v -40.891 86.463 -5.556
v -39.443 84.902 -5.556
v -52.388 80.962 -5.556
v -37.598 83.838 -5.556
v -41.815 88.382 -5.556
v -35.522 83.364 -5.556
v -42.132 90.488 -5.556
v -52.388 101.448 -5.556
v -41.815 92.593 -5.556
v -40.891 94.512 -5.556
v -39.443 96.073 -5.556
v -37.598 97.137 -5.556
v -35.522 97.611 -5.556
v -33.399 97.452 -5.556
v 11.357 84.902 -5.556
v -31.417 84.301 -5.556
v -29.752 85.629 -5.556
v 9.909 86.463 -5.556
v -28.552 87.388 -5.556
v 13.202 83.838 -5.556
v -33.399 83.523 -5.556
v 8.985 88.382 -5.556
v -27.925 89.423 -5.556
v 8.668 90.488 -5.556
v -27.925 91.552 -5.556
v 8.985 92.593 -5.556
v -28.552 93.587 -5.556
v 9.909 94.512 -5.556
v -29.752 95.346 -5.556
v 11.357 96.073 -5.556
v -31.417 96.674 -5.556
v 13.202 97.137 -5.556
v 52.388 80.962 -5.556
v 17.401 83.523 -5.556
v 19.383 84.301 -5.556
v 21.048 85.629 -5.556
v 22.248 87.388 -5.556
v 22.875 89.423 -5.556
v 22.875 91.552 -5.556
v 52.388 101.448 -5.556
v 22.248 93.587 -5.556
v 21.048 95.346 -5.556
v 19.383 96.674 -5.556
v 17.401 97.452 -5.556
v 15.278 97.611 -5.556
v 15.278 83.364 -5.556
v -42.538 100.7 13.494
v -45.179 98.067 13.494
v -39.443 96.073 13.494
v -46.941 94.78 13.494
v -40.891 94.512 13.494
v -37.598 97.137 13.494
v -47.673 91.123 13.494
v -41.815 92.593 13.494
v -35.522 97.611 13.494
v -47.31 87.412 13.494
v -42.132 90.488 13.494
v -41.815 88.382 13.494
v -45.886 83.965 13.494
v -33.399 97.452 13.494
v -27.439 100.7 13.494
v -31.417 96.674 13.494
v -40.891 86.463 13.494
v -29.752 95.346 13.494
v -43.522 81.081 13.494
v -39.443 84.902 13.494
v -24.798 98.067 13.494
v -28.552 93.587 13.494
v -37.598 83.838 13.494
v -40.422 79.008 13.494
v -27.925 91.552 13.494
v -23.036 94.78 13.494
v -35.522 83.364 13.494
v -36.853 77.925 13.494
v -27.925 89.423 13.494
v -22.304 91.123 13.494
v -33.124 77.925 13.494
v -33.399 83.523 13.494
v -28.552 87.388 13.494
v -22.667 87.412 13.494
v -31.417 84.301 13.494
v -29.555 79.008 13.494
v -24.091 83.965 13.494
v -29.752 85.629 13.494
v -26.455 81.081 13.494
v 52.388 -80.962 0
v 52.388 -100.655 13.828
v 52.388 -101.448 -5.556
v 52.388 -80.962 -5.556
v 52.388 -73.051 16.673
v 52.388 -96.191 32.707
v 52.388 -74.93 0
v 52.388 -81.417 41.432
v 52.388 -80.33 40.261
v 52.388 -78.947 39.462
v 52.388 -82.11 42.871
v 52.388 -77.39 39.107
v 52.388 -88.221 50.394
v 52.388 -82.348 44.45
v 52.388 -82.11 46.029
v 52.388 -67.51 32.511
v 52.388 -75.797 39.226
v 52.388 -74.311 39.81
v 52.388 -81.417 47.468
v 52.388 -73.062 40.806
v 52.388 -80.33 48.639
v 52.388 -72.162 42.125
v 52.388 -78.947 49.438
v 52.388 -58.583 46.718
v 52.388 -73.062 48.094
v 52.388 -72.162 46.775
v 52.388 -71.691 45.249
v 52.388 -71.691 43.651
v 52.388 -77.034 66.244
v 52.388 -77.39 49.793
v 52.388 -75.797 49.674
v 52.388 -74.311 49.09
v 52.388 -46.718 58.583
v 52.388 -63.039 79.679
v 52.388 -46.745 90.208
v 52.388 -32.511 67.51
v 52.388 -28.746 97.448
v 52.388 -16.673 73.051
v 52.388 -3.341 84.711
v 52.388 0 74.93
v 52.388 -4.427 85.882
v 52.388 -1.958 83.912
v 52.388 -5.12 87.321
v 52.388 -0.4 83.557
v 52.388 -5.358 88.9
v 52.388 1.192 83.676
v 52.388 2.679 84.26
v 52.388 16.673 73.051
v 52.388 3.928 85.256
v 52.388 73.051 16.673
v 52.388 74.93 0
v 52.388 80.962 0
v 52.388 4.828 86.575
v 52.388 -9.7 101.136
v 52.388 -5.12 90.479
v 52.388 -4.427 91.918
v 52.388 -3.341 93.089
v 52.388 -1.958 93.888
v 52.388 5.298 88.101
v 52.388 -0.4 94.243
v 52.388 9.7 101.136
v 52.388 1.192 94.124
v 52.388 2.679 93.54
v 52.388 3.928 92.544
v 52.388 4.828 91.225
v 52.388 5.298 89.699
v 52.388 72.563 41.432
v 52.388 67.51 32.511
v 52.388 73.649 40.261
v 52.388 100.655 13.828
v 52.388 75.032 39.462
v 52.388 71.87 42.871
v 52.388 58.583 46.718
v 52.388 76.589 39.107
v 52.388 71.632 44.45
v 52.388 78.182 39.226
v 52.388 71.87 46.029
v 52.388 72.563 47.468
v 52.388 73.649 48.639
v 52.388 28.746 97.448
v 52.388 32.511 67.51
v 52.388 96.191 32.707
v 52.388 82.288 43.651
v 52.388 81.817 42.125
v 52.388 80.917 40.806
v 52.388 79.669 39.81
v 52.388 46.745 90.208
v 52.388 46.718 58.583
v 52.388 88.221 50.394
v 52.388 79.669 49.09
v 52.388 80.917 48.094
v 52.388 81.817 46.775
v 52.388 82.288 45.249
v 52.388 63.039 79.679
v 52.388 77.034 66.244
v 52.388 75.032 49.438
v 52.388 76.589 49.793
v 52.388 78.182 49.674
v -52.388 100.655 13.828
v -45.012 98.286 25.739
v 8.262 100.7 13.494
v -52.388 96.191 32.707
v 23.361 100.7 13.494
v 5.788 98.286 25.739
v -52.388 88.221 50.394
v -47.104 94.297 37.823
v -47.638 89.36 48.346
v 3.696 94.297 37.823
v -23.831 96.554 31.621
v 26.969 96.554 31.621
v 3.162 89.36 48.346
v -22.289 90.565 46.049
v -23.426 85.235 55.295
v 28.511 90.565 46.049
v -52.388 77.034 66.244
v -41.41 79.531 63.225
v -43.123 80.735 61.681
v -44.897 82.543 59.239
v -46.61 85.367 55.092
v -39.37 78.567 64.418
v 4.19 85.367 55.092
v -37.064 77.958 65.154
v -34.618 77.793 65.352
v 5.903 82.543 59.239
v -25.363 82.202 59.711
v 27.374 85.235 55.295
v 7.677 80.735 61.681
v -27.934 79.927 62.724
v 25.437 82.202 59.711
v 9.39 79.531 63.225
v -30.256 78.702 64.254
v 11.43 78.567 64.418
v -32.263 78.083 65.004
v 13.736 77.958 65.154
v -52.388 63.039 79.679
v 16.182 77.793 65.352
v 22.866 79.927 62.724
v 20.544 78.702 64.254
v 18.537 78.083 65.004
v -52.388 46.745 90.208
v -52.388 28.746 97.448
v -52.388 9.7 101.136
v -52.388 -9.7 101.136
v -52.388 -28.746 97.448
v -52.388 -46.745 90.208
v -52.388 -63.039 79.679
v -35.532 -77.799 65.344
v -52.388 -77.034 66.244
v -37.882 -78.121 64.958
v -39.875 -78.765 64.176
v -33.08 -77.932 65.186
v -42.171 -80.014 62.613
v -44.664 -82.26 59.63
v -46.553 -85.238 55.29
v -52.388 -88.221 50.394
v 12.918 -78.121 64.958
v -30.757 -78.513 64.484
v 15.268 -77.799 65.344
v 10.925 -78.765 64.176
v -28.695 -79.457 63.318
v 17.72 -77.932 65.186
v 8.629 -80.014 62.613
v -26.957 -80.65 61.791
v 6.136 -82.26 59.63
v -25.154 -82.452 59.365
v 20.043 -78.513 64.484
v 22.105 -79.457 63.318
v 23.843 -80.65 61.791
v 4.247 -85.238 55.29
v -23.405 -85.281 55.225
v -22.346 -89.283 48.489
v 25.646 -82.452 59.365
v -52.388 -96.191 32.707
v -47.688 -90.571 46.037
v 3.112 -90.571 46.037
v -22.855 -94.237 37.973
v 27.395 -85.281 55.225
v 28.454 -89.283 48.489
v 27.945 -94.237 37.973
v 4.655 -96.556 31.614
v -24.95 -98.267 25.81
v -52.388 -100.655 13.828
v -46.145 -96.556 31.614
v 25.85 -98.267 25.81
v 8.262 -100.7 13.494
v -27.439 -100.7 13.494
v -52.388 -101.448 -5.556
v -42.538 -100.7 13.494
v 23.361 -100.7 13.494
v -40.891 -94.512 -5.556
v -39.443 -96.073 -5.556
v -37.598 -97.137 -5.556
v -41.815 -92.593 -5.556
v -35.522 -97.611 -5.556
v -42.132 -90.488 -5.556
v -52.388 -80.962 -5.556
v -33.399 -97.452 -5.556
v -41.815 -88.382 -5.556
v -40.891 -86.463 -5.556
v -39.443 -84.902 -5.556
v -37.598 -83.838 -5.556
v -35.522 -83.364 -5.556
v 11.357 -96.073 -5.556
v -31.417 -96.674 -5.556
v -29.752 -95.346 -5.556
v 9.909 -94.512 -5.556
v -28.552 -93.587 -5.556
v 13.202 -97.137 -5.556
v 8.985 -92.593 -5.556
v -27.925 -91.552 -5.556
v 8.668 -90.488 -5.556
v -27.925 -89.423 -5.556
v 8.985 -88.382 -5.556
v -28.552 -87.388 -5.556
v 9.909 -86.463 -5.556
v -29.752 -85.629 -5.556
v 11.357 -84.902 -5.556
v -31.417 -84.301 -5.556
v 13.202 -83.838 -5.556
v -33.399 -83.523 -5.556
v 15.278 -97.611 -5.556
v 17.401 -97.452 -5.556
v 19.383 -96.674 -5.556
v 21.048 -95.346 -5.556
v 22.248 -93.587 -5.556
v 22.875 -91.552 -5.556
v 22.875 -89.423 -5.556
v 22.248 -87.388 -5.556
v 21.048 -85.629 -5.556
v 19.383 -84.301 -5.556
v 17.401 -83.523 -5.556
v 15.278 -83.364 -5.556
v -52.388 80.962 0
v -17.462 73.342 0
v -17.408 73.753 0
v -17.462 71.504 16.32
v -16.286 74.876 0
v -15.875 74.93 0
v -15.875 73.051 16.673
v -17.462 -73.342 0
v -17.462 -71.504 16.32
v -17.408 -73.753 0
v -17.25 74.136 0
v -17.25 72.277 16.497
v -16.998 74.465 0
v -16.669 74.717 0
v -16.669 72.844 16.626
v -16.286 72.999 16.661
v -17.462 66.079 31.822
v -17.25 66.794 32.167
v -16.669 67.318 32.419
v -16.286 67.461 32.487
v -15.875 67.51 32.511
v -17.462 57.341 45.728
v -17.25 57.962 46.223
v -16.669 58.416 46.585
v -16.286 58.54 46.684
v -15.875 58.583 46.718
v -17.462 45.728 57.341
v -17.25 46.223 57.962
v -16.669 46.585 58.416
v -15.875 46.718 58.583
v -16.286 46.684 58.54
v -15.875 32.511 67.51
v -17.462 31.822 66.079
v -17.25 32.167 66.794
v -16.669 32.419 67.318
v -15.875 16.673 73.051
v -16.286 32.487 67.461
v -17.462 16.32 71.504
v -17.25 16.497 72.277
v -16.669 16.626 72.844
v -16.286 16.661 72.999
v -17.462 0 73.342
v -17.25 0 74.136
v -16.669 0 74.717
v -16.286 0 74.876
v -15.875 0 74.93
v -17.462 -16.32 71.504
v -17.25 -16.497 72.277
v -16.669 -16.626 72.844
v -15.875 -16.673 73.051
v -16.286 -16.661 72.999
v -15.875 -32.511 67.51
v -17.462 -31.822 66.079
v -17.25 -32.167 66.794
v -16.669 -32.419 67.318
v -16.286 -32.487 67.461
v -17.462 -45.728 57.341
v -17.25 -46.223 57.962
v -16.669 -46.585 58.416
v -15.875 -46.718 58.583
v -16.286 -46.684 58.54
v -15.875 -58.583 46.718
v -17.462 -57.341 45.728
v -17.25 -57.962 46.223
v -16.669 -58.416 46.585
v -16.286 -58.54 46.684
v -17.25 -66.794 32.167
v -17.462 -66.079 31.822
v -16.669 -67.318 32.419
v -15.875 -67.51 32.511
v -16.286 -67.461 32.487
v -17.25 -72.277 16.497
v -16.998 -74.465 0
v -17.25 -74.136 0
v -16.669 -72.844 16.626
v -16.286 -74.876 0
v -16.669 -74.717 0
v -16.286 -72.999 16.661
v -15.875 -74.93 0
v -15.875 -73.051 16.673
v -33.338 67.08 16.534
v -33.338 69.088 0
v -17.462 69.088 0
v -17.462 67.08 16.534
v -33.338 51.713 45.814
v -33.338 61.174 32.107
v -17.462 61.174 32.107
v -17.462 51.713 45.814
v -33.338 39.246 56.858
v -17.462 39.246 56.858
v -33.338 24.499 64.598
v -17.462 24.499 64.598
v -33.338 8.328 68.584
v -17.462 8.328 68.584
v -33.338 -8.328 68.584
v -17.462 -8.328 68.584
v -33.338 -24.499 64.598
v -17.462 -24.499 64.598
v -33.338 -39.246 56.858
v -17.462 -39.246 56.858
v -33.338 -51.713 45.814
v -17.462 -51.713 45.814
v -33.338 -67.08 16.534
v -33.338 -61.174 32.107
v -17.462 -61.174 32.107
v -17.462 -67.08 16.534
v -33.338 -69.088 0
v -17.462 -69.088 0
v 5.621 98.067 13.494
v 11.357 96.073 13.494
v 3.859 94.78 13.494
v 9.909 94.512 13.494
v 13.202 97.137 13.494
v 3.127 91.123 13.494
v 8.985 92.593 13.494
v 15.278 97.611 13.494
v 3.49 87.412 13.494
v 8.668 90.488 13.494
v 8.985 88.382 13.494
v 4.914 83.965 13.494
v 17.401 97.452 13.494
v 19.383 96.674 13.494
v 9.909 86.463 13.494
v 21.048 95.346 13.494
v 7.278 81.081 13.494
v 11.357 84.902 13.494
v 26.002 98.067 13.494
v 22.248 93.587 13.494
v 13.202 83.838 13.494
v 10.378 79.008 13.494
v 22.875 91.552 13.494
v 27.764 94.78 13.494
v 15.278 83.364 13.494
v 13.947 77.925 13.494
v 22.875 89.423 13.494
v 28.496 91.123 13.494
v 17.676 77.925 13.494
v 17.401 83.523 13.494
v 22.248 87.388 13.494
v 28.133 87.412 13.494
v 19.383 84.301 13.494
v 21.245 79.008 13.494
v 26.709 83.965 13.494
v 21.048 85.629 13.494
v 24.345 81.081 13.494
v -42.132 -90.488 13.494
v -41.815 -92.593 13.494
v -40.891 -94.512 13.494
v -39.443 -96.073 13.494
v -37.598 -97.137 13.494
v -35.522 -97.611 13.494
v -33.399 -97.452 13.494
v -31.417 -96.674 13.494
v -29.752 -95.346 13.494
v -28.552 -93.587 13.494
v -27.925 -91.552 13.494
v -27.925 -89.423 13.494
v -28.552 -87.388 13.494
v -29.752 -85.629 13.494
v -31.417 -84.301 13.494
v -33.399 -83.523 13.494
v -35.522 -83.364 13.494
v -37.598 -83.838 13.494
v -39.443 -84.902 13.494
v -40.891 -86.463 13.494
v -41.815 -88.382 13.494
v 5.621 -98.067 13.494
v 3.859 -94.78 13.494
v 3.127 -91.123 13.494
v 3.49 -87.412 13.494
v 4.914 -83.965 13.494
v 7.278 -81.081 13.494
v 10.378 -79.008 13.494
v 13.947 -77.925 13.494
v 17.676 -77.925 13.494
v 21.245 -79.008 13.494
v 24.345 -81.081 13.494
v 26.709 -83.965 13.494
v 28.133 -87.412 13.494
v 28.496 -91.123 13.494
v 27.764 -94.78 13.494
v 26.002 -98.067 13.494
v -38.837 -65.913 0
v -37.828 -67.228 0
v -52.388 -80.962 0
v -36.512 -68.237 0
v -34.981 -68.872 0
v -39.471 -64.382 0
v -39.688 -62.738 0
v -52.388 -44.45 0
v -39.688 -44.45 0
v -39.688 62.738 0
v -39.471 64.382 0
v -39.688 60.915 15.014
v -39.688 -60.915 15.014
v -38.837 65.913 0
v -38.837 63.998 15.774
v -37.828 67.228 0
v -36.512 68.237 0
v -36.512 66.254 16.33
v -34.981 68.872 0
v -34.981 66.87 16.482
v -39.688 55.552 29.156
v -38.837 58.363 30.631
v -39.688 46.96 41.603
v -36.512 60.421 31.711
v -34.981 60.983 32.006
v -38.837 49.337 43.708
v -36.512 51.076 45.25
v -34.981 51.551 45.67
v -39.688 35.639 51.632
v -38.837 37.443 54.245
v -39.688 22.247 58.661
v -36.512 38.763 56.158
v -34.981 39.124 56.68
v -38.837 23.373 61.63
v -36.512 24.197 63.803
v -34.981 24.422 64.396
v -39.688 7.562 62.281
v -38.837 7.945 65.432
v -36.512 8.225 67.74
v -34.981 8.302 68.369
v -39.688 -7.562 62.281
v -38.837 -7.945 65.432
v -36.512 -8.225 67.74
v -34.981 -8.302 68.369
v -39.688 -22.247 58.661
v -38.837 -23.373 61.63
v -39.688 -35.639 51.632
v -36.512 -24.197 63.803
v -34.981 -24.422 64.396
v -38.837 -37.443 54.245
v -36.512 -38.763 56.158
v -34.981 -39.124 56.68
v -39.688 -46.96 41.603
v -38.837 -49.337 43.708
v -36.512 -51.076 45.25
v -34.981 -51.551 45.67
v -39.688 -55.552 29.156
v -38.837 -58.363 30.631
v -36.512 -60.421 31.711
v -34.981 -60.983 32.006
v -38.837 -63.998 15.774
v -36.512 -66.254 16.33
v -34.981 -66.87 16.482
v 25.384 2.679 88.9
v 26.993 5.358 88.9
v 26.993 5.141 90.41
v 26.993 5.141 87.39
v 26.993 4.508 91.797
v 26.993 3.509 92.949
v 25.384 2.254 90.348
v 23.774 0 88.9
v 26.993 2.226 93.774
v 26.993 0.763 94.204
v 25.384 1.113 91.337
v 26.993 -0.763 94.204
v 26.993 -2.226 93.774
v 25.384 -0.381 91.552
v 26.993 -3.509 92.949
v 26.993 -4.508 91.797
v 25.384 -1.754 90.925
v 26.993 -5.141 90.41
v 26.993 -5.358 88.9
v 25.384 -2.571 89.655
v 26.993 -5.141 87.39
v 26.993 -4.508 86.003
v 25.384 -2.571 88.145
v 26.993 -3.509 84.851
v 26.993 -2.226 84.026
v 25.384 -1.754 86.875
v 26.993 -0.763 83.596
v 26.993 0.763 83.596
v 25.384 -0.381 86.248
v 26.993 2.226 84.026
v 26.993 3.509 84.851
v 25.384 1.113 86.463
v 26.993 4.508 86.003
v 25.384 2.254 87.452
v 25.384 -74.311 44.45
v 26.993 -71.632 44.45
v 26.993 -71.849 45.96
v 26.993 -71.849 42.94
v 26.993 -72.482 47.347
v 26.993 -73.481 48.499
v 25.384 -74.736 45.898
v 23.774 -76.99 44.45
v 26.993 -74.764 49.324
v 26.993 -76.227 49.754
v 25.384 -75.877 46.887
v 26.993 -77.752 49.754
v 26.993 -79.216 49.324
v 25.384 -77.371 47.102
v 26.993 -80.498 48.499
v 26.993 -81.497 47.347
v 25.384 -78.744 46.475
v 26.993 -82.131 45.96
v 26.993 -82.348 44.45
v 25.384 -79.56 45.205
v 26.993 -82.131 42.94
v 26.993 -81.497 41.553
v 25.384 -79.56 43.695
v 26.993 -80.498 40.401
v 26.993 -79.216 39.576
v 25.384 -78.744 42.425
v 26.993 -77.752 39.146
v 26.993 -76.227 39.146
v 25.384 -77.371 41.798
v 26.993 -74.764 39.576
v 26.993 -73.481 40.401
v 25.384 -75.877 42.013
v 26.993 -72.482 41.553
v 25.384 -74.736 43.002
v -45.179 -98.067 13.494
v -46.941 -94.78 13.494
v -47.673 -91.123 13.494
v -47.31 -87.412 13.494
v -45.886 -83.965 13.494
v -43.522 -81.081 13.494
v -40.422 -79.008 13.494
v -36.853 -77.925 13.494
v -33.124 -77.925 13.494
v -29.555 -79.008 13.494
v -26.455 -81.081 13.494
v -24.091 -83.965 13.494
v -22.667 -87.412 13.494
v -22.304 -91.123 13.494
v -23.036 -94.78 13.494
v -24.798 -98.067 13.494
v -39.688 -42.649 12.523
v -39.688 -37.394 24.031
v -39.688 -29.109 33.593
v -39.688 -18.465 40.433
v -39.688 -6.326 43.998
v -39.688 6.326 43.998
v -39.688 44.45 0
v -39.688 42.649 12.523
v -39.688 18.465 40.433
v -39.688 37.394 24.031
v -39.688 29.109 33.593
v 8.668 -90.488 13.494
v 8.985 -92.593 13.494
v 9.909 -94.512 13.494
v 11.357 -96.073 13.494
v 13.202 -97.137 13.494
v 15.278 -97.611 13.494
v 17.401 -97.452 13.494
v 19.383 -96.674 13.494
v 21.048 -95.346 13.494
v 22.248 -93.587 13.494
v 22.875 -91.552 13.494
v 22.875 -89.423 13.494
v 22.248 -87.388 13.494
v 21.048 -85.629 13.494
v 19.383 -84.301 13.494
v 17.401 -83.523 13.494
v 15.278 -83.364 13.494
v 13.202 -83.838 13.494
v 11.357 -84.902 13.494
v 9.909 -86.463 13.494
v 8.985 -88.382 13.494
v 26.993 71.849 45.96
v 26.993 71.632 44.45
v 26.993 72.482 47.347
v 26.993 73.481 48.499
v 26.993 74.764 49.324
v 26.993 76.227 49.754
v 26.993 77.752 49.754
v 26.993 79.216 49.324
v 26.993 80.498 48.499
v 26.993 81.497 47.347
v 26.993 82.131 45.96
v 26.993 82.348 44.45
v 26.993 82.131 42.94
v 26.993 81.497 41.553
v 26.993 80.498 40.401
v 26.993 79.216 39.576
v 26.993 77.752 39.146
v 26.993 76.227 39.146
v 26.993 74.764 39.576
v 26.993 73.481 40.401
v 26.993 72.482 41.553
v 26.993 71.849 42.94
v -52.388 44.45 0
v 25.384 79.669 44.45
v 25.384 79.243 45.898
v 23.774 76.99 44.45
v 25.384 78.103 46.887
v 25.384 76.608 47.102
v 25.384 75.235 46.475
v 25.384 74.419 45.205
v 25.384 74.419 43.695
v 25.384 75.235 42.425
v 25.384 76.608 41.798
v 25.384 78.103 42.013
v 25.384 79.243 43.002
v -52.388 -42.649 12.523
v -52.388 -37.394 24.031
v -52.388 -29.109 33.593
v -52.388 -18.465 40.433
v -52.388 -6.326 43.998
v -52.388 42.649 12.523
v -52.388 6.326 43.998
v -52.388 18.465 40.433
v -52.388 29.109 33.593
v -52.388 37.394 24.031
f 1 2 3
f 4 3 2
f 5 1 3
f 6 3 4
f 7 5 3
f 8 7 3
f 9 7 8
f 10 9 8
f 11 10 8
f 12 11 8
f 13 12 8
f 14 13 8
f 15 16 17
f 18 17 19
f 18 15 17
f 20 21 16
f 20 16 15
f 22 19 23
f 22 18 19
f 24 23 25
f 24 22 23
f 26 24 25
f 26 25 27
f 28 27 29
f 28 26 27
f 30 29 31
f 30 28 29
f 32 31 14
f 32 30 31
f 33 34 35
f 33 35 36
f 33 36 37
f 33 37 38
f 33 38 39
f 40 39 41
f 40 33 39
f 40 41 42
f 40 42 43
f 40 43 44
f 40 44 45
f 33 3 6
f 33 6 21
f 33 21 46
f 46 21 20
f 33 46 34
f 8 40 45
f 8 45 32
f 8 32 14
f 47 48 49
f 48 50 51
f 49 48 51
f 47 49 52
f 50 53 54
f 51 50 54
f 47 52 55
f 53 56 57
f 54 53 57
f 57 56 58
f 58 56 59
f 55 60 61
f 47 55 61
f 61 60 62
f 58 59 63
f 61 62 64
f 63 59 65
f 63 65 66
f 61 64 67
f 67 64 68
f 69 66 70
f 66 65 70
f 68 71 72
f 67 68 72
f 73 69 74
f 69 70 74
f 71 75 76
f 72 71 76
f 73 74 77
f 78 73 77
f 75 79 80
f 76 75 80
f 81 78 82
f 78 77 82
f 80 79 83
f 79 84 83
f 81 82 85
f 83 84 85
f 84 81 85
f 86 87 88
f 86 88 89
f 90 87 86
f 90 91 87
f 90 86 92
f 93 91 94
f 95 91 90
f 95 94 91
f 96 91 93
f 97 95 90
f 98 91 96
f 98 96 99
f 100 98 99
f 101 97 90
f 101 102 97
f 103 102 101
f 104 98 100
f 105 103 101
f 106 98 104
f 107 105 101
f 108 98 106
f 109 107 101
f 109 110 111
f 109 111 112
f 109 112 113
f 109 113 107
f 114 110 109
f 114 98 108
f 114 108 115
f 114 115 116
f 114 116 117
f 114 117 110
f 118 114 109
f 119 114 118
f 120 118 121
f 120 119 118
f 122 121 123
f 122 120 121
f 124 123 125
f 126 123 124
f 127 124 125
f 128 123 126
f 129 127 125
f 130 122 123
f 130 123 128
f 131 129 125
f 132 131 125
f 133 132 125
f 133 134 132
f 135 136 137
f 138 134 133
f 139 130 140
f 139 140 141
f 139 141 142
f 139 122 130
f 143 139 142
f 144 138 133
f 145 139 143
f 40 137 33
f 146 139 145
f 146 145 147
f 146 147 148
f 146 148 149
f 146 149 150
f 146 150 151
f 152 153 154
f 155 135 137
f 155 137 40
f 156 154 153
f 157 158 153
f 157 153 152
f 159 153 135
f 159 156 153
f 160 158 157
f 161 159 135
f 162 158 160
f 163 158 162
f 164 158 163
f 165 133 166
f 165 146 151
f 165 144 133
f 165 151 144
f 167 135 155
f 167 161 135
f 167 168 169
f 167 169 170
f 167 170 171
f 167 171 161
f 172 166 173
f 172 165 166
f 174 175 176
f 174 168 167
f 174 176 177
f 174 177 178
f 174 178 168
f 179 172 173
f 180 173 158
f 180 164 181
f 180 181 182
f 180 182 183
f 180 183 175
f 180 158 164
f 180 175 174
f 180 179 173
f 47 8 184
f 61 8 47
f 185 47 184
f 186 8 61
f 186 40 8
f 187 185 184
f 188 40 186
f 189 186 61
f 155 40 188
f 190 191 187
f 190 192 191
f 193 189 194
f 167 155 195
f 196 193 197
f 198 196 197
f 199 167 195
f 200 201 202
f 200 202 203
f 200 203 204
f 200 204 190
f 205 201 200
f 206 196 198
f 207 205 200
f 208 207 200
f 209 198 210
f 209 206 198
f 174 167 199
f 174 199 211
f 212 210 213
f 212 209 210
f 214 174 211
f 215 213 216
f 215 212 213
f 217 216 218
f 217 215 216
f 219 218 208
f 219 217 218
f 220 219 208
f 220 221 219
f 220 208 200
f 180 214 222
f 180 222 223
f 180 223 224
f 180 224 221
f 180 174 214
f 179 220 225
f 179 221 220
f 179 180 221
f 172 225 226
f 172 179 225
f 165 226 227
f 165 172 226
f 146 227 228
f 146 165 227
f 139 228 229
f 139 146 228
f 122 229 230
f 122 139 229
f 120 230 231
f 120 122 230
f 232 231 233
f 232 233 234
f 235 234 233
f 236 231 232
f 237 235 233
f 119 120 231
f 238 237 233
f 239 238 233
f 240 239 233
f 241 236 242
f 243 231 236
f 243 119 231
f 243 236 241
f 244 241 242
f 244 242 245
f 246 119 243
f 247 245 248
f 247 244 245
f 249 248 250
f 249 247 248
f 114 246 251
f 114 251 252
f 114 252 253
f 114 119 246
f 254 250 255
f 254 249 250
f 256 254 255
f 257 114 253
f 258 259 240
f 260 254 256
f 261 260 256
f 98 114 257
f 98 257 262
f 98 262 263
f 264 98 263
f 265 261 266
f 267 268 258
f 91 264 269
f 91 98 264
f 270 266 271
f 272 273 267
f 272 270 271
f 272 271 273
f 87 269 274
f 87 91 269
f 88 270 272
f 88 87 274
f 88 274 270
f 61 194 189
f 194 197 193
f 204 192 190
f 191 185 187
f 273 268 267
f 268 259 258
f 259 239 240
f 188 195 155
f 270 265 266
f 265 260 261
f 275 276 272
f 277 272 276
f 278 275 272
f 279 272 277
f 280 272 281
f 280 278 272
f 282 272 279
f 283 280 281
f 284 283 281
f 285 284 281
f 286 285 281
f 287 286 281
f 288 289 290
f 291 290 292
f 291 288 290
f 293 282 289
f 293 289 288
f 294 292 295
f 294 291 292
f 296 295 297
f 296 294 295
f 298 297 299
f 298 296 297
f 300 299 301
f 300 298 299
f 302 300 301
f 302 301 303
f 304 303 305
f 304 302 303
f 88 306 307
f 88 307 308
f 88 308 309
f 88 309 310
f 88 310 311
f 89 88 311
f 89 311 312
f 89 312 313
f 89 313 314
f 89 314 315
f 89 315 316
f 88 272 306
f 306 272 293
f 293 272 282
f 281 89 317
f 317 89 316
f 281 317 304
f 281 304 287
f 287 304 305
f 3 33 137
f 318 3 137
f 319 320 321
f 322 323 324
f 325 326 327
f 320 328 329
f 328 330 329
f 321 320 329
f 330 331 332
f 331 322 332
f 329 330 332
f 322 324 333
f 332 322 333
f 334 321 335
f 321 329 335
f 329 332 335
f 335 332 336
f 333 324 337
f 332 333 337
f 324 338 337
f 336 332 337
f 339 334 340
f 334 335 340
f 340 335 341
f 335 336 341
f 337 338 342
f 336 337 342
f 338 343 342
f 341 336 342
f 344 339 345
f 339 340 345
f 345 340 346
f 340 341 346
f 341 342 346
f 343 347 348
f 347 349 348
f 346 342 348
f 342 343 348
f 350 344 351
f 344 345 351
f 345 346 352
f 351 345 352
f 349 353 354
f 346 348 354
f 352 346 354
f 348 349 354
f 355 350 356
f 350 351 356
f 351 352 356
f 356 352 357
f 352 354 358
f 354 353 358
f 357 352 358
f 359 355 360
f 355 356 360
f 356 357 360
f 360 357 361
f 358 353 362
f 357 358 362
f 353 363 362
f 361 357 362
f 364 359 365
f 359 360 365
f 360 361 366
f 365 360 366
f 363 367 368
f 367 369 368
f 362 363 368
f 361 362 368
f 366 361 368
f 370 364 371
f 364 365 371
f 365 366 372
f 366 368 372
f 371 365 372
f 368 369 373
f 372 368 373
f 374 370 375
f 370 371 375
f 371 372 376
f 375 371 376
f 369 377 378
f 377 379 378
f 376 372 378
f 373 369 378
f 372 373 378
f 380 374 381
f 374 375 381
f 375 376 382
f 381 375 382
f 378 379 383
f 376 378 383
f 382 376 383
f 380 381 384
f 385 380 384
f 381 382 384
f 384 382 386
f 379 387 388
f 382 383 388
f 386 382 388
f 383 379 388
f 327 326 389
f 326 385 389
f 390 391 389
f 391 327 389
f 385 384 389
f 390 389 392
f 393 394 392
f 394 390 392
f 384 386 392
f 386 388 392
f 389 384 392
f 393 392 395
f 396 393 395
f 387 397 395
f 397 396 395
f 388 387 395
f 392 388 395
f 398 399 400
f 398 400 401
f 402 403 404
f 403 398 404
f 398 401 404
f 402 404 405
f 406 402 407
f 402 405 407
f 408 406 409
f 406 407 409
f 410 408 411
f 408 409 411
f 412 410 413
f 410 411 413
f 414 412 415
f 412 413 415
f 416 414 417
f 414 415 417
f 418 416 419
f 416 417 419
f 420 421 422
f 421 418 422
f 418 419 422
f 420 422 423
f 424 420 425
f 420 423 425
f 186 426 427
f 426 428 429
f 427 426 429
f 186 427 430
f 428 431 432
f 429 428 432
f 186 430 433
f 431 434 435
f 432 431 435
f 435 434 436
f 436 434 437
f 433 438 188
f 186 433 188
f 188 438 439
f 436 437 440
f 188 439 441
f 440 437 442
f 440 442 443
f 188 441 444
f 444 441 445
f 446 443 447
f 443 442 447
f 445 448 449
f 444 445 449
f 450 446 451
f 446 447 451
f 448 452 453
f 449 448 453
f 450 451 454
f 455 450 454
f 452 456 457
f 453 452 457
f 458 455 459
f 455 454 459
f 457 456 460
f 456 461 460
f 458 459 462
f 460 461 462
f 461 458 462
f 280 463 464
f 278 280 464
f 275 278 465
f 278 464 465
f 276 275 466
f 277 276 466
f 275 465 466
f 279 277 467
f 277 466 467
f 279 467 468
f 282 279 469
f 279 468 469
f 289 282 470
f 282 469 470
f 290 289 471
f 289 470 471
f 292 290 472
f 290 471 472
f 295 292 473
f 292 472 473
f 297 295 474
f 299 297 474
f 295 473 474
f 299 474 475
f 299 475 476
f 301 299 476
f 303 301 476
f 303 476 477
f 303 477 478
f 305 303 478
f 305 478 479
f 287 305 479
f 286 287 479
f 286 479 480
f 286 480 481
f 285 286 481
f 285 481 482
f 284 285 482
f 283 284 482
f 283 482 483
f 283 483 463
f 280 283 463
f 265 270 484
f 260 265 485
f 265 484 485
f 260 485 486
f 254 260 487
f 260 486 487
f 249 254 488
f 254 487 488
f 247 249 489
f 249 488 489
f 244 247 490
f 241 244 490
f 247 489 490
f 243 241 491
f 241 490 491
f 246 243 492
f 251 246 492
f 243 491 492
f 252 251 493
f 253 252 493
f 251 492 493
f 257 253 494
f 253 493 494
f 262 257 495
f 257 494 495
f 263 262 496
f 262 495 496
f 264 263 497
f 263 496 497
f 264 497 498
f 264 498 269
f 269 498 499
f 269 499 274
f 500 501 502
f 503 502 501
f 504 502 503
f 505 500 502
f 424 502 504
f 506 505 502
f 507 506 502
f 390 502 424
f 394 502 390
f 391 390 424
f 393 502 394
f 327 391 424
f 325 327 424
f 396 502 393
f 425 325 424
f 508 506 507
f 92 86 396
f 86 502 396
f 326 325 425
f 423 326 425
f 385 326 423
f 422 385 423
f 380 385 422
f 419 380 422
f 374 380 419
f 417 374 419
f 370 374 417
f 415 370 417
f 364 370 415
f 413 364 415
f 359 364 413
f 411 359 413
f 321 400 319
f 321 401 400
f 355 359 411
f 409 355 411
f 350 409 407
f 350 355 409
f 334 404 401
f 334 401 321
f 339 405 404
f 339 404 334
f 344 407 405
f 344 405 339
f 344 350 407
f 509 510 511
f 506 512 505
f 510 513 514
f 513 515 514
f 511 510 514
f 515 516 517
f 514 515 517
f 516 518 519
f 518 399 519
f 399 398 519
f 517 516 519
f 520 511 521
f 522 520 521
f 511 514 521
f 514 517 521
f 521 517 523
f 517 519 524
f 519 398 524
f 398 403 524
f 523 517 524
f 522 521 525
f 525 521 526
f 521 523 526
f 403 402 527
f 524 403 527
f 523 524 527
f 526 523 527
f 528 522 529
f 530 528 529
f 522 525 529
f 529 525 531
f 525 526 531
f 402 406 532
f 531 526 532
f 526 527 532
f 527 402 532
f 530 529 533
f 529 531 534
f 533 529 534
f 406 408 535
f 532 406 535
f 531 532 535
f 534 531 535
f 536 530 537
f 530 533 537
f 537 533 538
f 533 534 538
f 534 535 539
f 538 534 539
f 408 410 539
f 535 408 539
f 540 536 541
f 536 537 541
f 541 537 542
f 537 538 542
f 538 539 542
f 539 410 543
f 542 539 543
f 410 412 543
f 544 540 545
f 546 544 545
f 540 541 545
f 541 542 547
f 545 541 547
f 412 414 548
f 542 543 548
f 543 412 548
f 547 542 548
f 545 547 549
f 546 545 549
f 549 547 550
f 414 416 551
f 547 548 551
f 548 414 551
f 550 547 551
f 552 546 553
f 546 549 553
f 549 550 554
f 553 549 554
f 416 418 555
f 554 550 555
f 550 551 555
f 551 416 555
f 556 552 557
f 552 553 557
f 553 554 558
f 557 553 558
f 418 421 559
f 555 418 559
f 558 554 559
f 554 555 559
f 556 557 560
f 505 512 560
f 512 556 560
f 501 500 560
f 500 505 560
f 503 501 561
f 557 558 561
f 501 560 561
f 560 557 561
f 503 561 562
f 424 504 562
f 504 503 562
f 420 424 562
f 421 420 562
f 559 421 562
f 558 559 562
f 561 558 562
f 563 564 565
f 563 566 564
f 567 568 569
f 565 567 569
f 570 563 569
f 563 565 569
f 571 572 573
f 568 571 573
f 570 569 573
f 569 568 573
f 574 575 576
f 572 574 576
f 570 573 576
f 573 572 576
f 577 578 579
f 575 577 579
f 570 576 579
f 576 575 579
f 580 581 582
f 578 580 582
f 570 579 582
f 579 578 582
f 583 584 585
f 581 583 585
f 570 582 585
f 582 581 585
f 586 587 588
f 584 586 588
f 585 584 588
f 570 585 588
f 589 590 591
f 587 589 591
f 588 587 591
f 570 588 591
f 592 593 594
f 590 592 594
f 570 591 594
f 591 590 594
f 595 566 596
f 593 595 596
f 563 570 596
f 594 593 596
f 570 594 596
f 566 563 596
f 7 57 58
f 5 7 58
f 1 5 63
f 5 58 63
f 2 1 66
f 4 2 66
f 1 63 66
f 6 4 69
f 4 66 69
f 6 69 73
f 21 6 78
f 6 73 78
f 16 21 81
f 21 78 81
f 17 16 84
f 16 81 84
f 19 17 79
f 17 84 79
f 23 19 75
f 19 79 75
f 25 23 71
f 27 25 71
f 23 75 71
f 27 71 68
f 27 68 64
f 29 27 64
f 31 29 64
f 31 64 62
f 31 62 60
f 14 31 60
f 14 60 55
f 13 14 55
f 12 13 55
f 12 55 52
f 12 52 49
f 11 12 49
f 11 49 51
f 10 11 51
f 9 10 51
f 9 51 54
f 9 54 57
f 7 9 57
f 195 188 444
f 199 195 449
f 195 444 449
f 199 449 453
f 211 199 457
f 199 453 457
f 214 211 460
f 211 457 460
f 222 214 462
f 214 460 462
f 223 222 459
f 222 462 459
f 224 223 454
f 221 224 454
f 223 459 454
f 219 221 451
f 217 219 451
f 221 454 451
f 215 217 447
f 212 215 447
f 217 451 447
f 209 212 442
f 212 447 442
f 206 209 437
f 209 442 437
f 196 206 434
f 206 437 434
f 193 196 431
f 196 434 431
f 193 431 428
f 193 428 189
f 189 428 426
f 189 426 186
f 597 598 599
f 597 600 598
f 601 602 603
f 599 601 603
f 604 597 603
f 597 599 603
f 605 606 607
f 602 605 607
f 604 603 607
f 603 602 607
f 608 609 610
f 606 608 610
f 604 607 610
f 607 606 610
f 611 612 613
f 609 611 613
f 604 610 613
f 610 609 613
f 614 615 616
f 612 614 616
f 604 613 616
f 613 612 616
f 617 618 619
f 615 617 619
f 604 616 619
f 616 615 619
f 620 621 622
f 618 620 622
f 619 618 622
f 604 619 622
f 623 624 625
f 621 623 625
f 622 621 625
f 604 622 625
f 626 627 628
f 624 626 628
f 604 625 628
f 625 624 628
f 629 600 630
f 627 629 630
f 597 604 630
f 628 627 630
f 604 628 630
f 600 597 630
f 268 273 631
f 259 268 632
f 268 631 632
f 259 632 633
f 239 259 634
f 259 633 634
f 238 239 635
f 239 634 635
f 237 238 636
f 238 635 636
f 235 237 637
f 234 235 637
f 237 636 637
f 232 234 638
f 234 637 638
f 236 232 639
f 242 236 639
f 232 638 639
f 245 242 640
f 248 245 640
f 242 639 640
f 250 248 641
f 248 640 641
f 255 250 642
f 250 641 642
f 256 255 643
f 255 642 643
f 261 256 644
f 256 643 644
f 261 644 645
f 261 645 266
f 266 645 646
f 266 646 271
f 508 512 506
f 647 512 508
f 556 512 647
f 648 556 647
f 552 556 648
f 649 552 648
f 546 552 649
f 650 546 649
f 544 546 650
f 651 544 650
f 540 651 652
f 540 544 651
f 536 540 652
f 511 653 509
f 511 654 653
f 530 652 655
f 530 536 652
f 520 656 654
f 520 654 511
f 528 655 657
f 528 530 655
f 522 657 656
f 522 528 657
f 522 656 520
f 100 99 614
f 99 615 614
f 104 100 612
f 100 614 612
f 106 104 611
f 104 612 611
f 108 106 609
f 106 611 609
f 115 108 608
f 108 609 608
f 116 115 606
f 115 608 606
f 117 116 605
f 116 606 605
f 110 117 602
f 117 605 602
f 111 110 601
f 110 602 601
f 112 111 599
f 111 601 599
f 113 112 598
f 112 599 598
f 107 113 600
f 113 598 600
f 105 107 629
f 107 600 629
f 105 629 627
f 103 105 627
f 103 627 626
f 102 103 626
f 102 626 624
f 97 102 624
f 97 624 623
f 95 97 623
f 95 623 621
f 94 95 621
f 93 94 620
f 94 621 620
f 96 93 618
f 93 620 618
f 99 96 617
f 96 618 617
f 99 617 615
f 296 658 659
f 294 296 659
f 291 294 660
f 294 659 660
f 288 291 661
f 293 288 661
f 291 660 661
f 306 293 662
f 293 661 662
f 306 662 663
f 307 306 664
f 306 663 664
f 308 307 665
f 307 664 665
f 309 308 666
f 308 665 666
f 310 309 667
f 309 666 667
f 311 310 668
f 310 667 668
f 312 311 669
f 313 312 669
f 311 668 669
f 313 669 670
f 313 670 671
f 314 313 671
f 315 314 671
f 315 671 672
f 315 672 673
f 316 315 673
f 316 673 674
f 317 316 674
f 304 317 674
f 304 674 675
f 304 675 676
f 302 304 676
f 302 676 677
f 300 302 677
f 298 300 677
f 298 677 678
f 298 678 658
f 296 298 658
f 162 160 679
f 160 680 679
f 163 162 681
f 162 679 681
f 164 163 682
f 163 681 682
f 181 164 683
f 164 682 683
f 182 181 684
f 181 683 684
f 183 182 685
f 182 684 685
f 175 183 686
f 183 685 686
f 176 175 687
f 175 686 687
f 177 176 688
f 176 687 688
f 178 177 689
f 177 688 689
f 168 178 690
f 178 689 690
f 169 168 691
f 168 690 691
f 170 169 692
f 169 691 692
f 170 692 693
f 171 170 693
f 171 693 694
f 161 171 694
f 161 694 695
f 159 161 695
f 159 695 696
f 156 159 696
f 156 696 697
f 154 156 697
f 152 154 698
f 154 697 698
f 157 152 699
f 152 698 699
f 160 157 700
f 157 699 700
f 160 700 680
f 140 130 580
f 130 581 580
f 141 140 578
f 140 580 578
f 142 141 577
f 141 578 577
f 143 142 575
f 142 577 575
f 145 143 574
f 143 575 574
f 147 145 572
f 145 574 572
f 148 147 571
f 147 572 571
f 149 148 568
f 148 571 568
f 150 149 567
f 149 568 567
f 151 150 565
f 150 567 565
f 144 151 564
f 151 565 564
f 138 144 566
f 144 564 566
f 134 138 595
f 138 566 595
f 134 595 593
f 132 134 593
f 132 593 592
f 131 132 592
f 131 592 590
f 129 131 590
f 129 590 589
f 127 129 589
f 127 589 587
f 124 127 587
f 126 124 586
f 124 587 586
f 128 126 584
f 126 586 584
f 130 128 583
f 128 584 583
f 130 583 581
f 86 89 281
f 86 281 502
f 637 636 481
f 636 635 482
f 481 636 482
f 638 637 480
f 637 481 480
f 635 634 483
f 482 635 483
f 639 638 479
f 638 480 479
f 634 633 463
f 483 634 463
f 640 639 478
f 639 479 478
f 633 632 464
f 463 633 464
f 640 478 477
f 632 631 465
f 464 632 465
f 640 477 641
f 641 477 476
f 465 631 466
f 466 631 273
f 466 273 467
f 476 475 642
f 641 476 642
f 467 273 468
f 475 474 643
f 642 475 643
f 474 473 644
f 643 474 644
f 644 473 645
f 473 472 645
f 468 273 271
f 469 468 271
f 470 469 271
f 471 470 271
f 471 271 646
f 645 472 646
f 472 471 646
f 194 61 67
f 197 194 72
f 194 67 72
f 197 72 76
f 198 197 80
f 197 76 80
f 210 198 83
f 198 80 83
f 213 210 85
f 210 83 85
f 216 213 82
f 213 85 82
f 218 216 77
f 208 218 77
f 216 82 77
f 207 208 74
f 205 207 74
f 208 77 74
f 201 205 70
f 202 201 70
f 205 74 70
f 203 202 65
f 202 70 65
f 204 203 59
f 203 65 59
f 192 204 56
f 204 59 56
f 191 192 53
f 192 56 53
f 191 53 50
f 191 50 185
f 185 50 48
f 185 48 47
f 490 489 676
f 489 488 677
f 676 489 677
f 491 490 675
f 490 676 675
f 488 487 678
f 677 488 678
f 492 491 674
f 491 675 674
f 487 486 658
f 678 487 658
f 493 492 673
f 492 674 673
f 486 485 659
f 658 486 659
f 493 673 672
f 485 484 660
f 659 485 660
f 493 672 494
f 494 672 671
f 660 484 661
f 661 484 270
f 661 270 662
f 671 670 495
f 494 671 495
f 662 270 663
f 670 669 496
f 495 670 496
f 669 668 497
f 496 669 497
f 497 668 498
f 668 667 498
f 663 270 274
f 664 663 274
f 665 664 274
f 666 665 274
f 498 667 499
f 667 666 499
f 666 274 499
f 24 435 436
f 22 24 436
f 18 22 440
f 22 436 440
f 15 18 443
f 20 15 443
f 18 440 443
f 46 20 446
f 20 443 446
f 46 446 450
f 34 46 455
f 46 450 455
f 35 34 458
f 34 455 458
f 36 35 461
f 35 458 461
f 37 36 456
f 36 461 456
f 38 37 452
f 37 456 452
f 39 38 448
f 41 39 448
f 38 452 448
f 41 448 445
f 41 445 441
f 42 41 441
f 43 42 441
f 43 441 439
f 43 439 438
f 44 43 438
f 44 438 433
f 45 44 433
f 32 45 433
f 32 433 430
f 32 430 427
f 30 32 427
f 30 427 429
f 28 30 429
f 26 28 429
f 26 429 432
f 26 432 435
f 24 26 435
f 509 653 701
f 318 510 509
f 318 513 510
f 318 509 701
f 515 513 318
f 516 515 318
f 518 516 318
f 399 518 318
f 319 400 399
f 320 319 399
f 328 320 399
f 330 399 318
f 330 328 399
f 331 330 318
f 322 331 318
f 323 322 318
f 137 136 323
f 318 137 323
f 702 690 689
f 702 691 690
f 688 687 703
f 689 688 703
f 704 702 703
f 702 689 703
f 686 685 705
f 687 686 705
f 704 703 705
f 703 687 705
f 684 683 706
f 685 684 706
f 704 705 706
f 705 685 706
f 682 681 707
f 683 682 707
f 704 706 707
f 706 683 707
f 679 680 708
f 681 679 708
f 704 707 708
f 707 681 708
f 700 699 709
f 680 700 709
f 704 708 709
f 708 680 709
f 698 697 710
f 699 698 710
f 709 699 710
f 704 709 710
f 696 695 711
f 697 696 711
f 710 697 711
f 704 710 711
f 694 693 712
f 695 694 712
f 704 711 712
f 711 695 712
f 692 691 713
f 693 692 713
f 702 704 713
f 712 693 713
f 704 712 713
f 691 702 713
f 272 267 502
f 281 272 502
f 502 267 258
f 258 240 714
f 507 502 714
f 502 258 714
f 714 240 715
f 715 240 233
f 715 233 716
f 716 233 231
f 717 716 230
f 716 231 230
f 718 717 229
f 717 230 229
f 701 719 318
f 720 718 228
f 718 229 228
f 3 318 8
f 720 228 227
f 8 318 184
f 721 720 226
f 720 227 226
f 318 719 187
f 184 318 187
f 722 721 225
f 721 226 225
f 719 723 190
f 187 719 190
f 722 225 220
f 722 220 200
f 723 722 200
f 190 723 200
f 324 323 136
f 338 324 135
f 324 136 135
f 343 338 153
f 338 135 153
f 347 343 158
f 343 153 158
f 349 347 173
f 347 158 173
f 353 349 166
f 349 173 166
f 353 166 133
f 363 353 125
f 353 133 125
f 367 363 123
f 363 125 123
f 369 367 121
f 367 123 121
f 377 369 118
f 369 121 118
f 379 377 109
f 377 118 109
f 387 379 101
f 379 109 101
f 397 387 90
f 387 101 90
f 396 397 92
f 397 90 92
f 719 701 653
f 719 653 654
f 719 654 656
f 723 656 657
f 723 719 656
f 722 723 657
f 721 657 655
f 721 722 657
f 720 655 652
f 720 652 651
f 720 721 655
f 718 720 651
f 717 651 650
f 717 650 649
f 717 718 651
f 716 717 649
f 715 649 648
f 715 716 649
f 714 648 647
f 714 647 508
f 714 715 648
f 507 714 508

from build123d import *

# Parameters (mm, degrees)
F0_R      = 101.6
F0_R_2    = 44.45
F1_DEPTH  = 52.3875
F2_R      = 69.088
F3_DEPTH  = 92.075
F4_R      = 74.93
F5_DEPTH  = 69.85
F6_R      = 6.35
F7_R      = 1.5875
F9_D      = 10.71626
F9_DEPTH  = 25.3941384615
F9_TIP    = 3.2194893086
F10_W     = 294.4396436214
F10_H     = 108.7958868504
F11_DEPTH = 104.776
F12_W     = 161.925
F12_H     = 25.4
F13_DEPTH = 104.7760001
F15_D     = 14.2875
F17_R     = 12.7
F18_DEPTH = 88.1072501


with BuildPart() as f1:
    # F0 (on Right) → F1 (new body, symmetric)
    with BuildSketch(Plane.YZ):
        Circle(F0_R)
        Circle(F0_R_2, mode=Mode.SUBTRACT)
    extrude(amount=F1_DEPTH, both=True)

    # F2 (on face) → F3 (cut)
    with BuildSketch(Plane.YZ.offset(52.3875)):
        Circle(F2_R)
    extrude(amount=-F3_DEPTH, mode=Mode.SUBTRACT)

    # F4 (on face) → F5 (cut)
    with BuildSketch(Plane.YZ.offset(52.3875)):
        Circle(F4_R)
    extrude(amount=-F5_DEPTH, mode=Mode.SUBTRACT)

    # F6
    f6_edges = [f1.edges().sort_by_distance(p)[0] for p in [
        (-39.6875, -69.088, 0),
    ]]
    fillet(f6_edges, radius=F6_R)

    # F7
    f7_edges = [f1.edges().sort_by_distance(p)[0] for p in [
        (-17.4625, -74.93, 0),
    ]]
    fillet(f7_edges, radius=F7_R)

    # F9
    with Locations(Plane.YZ.offset(52.3875)):
        with Locations((-76.9896583964, 44.45), (0, 88.9), (76.9896583964, 44.45)):
            Hole(F9_D / 2, depth=F9_DEPTH)
            with Locations((0, 0, -(F9_DEPTH + F9_TIP / 2))):  # 118° drill point
                Cone(0, F9_D / 2, F9_TIP, mode=Mode.SUBTRACT)

    # F10 (on face) → F11 (cut, through all)
    with BuildSketch(Plane.YZ.offset(52.3875)):
        with Locations((-3.7660896778, -59.9541934252)):
            Rectangle(F10_W, F10_H)
    extrude(amount=-F11_DEPTH, mode=Mode.SUBTRACT)

    # F12 (on face) → F13 (cut, through all)
    with BuildSketch(Plane.YZ.offset(52.3875)):
        with Locations((0, -12.7)):
            Rectangle(F12_W, F12_H)
    extrude(amount=-F13_DEPTH, mode=Mode.SUBTRACT)

    # F15 (through all)
    with Locations(Plane(origin=(0, 0, -5.55625), x_dir=(1, 0, 0), z_dir=(0, 0, -1))):
        with Locations((15.8115, 90.4875), (-34.9885, 90.4875), (15.8115, -90.4875), (-34.9885, -90.4875)):
            Hole(F15_D / 2)

    # F17 (on offset) → F18 (cut, through all)
    with BuildSketch(Plane(origin=(0, 0, 13.49375), x_dir=(1, 0, 0), z_dir=(0, 0, -1))):
        with Locations((-34.9885, 90.4875)):
            Circle(F17_R)
        with Locations((15.8115, 90.4875)):
            Circle(F17_R)
        with Locations((-34.9885, -90.4875)):
            Circle(F17_R)
        with Locations((15.8115, -90.4875)):
            Circle(F17_R)
    extrude(amount=-F18_DEPTH, mode=Mode.SUBTRACT)


solid = f1.part
